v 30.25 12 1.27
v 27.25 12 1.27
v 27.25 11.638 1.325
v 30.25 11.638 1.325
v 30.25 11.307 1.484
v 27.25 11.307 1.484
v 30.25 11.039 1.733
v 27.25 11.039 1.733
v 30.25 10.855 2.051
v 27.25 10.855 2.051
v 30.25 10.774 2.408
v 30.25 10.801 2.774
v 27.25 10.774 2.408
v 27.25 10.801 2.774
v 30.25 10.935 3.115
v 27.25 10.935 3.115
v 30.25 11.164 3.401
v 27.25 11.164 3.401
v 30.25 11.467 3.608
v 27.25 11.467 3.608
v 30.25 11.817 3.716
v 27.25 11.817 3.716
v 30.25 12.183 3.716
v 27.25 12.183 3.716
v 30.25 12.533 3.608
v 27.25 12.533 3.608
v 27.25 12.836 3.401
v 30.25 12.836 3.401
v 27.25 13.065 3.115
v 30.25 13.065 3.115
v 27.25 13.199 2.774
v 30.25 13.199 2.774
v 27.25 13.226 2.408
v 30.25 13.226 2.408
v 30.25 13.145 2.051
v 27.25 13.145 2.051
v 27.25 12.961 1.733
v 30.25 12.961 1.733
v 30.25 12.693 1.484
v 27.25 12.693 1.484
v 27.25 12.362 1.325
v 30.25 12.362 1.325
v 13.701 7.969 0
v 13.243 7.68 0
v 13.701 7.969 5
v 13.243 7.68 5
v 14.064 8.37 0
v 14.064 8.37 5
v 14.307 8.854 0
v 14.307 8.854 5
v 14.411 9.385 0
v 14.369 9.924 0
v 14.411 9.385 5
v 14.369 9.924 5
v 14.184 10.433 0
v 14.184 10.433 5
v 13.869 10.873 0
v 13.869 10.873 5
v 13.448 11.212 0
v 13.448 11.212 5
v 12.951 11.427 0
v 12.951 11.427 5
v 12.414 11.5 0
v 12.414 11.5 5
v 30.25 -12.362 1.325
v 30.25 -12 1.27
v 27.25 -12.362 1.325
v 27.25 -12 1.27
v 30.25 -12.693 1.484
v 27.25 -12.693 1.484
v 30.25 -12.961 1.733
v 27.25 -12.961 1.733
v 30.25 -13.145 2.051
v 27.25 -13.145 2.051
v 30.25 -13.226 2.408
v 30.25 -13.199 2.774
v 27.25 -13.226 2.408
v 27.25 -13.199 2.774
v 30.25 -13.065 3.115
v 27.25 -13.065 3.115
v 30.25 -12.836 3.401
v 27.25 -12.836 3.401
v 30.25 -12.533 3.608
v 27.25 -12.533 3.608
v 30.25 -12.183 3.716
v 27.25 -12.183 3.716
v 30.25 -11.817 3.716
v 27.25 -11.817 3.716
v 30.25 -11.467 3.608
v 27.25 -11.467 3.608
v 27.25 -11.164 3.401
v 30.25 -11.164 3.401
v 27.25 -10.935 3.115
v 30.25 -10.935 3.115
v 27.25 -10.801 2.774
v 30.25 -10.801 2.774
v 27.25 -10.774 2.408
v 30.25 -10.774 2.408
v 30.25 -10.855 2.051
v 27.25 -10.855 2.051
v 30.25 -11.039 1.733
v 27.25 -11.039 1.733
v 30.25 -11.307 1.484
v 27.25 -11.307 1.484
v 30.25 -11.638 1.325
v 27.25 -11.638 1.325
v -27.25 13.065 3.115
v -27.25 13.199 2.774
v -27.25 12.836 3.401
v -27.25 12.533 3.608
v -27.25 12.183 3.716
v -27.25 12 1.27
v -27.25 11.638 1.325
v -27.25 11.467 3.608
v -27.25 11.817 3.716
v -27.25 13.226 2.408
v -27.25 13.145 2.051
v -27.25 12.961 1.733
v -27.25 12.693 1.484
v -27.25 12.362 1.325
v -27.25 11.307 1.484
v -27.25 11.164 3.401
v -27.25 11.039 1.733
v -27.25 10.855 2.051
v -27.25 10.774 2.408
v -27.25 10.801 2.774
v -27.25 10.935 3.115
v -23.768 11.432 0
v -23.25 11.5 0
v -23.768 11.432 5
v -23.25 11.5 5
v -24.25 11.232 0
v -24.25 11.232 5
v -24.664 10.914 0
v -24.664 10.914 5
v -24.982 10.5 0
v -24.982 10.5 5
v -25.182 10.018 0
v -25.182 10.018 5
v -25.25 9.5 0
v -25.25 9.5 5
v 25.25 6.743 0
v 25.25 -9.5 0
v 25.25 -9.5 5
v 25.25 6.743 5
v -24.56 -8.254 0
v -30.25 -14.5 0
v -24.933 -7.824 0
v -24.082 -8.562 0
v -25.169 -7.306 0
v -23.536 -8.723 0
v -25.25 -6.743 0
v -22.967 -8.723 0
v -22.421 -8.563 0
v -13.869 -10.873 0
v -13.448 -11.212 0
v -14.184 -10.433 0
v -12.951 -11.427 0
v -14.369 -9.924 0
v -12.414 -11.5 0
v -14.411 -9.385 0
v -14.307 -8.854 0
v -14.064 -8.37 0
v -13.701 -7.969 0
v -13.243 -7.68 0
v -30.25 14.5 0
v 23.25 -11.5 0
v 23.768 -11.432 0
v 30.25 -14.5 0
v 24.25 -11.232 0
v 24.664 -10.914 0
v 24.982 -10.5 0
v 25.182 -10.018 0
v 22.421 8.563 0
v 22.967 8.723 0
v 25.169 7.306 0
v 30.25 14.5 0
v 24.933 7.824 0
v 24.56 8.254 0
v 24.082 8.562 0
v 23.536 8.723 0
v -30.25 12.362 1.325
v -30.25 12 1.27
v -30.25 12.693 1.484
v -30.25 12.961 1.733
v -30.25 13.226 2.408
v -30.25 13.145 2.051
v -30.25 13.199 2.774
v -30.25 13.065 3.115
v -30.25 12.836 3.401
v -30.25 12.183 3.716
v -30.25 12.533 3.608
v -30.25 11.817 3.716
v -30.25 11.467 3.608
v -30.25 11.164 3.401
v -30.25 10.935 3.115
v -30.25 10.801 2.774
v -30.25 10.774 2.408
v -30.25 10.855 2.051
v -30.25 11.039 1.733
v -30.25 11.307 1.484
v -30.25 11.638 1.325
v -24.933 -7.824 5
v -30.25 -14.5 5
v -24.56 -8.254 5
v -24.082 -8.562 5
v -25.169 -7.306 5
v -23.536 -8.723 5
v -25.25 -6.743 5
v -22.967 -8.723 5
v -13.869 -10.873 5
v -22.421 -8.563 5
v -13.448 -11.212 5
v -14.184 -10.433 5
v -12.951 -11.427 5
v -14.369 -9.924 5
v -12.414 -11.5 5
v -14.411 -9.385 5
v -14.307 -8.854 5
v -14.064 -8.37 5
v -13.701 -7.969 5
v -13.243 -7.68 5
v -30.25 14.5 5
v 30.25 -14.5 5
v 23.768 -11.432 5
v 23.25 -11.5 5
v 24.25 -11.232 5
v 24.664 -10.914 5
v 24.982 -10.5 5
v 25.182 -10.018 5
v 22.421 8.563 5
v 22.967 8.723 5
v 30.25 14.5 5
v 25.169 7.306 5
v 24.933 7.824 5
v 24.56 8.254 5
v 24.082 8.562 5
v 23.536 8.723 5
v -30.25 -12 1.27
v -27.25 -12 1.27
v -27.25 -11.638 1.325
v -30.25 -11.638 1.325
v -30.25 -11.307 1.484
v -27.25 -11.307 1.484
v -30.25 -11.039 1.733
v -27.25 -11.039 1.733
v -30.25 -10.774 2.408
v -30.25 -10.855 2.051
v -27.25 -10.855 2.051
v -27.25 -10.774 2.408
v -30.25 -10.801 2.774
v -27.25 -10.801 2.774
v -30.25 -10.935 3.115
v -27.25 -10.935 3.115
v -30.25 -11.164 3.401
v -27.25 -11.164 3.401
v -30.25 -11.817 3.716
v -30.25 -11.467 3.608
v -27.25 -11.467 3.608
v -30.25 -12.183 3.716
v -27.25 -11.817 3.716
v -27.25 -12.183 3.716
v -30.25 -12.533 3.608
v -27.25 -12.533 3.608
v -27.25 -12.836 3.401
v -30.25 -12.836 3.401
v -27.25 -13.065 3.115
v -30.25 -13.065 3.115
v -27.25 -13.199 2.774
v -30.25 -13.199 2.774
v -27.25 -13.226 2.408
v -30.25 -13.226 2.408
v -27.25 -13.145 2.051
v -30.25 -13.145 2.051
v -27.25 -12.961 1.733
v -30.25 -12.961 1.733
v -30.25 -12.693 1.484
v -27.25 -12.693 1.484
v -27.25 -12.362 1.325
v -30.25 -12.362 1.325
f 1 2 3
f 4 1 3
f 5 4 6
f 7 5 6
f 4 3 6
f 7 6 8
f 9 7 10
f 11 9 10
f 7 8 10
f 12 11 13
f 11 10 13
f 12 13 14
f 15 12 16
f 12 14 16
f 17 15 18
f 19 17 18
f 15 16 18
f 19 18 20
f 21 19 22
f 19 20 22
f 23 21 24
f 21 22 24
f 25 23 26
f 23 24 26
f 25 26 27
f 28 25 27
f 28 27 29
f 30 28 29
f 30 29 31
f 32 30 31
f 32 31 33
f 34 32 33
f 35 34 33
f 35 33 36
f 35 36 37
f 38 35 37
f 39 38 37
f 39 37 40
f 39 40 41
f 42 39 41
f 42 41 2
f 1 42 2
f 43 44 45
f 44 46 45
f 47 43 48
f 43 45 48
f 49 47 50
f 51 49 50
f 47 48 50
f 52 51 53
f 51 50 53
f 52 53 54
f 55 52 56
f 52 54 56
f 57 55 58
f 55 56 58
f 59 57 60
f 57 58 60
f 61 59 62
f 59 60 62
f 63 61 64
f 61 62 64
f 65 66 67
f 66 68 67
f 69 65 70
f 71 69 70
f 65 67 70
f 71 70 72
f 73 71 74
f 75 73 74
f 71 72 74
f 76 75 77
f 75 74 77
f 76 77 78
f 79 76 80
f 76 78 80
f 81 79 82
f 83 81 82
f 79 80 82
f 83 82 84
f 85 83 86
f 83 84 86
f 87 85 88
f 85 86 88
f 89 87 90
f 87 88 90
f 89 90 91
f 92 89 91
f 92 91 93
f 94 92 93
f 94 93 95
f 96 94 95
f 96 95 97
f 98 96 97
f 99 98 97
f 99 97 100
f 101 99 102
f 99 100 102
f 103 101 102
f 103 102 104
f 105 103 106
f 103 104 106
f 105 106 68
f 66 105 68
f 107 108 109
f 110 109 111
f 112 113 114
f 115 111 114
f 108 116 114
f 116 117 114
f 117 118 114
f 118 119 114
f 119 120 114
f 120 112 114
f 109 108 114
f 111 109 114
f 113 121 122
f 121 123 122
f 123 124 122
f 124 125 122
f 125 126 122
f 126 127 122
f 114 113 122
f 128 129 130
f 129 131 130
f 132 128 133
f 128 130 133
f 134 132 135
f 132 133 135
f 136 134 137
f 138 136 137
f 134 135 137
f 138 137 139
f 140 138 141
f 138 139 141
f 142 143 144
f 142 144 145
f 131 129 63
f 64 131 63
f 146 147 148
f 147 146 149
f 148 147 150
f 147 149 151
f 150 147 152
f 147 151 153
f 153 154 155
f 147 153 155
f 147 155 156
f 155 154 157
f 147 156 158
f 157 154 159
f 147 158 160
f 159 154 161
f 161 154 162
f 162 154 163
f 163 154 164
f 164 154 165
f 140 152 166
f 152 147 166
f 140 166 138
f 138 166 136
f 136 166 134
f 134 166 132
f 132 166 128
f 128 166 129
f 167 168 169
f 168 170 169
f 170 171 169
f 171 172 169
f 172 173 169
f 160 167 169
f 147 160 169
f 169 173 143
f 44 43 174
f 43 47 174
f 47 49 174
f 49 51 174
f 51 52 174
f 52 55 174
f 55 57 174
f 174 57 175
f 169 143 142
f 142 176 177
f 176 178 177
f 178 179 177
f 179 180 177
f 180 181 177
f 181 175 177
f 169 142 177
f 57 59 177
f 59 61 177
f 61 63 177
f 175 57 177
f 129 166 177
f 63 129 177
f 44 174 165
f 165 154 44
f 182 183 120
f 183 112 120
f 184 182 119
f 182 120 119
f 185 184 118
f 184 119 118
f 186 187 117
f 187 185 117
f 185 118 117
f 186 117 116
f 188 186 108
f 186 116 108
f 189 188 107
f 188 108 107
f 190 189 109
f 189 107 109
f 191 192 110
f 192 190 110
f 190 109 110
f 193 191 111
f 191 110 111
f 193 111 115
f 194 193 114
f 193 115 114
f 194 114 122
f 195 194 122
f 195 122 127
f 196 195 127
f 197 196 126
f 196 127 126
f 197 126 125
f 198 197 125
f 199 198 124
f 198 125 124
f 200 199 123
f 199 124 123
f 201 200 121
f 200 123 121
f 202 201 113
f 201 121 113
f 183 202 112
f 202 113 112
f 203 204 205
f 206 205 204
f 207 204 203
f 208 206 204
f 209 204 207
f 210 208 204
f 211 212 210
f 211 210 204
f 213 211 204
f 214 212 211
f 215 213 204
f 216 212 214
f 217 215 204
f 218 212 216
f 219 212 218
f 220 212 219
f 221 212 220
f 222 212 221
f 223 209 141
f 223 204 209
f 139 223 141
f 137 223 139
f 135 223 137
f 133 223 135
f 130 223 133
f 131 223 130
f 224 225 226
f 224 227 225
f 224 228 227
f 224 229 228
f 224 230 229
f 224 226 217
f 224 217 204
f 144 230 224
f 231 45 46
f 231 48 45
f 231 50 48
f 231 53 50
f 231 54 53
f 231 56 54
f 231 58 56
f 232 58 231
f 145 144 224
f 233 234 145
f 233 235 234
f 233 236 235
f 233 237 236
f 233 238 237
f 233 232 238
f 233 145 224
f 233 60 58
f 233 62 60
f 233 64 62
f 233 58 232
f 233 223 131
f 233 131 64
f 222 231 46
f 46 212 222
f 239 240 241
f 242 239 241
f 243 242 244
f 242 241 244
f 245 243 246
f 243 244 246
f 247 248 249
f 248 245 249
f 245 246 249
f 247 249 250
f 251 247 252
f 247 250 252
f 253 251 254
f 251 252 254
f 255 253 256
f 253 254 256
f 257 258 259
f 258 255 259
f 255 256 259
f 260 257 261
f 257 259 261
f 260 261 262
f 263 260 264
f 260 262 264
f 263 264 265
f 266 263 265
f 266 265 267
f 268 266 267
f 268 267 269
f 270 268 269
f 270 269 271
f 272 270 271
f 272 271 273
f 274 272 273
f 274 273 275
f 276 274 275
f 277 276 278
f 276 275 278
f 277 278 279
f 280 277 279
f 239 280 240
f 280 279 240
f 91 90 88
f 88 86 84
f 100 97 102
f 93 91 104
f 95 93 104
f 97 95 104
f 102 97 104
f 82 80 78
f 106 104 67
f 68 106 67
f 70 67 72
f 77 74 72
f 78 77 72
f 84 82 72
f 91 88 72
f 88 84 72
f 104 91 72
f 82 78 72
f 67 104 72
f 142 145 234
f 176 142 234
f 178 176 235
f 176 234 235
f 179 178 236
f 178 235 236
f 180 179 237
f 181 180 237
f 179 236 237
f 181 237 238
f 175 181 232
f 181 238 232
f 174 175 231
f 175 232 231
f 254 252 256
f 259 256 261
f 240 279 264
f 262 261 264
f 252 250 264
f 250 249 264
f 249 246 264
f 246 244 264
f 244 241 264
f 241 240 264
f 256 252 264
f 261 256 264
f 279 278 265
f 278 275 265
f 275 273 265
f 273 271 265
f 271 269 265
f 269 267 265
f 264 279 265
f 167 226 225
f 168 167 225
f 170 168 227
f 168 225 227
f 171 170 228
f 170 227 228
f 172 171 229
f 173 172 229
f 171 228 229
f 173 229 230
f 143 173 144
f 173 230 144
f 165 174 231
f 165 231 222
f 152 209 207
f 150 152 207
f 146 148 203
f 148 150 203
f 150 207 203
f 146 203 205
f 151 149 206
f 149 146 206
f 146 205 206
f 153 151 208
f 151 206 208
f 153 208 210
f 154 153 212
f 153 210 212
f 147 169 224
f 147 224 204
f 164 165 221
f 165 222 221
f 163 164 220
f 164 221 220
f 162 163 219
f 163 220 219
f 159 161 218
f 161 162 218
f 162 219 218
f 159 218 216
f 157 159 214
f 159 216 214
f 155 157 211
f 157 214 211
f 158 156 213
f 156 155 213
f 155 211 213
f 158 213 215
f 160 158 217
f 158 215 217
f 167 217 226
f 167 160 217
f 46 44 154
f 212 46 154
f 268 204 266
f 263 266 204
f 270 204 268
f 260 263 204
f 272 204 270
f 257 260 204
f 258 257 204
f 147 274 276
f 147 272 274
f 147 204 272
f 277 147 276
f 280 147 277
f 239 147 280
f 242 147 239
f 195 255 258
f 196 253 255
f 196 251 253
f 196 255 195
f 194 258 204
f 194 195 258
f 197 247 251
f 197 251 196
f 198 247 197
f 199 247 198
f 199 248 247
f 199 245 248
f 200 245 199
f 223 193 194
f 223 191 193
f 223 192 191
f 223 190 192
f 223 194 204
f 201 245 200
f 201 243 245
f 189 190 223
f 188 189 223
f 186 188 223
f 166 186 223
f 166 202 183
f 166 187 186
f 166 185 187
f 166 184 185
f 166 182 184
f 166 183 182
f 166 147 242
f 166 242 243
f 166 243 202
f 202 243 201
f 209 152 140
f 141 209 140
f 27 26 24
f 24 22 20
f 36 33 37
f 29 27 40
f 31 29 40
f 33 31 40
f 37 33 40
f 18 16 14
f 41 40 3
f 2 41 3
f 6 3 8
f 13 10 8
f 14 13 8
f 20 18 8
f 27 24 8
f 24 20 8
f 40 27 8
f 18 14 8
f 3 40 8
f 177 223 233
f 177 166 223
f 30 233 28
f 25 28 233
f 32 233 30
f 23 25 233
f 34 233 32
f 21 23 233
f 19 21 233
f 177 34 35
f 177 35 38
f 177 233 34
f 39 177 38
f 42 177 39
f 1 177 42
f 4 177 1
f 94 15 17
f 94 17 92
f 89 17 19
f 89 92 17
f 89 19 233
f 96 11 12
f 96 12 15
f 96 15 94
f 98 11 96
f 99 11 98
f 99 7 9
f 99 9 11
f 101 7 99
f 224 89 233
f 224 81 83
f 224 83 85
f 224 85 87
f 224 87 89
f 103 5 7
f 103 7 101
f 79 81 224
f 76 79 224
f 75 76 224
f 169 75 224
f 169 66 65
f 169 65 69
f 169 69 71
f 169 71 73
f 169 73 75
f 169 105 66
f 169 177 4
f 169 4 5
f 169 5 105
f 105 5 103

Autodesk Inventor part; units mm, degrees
ref_plane "YZ Plane" through (0, 0, 0) normal (1, 0, 0) x (0, 1, 0)
ref_plane "XZ Plane" through (0, 0, 0) normal (0, 1, 0) x (-1, 0, 0)
ref_plane "XY Plane" through (0, 0, 0) normal (0, 0, 1) x (1, 0, 0)
sketch "スケッチ1" plane through (0, 0, 0) normal (0, 0, 1) x (1, 0, 0)
  line L0 (-30.25, 14.5) -> (30.25, 14.5)
  line L1 (30.25, 14.5) -> (30.25, -14.5)
  line L2 (30.25, -14.5) -> (-30.25, -14.5)
  line L3 (-30.25, -14.5) -> (-30.25, 14.5)
  line L4 (-25.25, 11.5) -> (25.25, 11.5) construction
  line L5 (25.25, 11.5) -> (25.25, -11.5) construction
  line L6 (25.25, -11.5) -> (-25.25, -11.5) construction
  line L7 (-25.25, -11.5) -> (-25.25, 11.5) construction
  line L8 (25.25, 11.5) -> (-25.25, -11.5) construction
  line L9 (-25.25, -9.8518) -> (-25.25, 11.5)
  line L10 (-25.25, 11.5) -> (21.631, 11.5)
  line L11 (21.631, 11.5) -> (-25.25, -9.8518)
  line L12 (-21.631, -11.5) -> (25.25, -11.5)
  line L13 (25.25, -11.5) -> (25.25, 9.8518)
  line L14 (25.25, 9.8518) -> (-21.631, -11.5)
  line L15 (-30.25, 12) -> (30.25, 12) construction
  line L16 (30.25, -12) -> (-30.25, -12) construction
  line L17 (30.25, 12) -> (30.25, -12) construction
  point P0 (0, 0)
  point P1 (0, 11.5)
  point P2 (0, 14.5)
  point P3 (25.25, 0)
  point P4 (30.25, 0)
  dimension "d0" = 5
  dimension "d1" = 3
  dimension "d2" = 1.5
  dimension "d3" = 24
  dimension "d4" = 2.5
  dimension "d16" = 60.5
extrude "押し出し1" add sketch "スケッチ1" along normal blind 5
sketch "スケッチ2" plane through (30.25, -14.5, 0) normal (1, 0, 0) x (0, 0, -1)
  line L0 (0, 29) -> (-5, 29) projected
  line L1 (-5, 0) -> (-5, 29) projected
  line L2 (0, 14.5) -> (-5, 14.5) construction
  point P0 (-2.5, 2.5)
  point P1 (-2.5, 26.5)
  point P2 (-2.5, 29)
  dimension "d7" = 24
hole "穴1" at (30.25, -12, 2.5) at (30.25, 12, 2.5) direction (-1, 0, 0) diameter 2.459 depth 3 thread size "M3x0.5" class "6H" standard "ISO Metric profile"
mirror "ミラー1" about plane through (0, 0, 0) normal (1, 0, 0) of "穴1"
fillet "フィレット1" radius 2 6 edges at (-21.631, -11.5, 2.5) (-25.25, -9.8518, 2.5) (25.25, 9.8518, 2.5) (25.25, -11.5, 2.5) (-25.25, 11.5, 2.5) (21.631, 11.5, 2.5)
equation "\"d3\" = d5_1"
equation "\"d7\" = d3"
equation "\"d5_1\" = 24"
properties part number "Link_back_diagonal" material "アルミニウム 2014-T4"
